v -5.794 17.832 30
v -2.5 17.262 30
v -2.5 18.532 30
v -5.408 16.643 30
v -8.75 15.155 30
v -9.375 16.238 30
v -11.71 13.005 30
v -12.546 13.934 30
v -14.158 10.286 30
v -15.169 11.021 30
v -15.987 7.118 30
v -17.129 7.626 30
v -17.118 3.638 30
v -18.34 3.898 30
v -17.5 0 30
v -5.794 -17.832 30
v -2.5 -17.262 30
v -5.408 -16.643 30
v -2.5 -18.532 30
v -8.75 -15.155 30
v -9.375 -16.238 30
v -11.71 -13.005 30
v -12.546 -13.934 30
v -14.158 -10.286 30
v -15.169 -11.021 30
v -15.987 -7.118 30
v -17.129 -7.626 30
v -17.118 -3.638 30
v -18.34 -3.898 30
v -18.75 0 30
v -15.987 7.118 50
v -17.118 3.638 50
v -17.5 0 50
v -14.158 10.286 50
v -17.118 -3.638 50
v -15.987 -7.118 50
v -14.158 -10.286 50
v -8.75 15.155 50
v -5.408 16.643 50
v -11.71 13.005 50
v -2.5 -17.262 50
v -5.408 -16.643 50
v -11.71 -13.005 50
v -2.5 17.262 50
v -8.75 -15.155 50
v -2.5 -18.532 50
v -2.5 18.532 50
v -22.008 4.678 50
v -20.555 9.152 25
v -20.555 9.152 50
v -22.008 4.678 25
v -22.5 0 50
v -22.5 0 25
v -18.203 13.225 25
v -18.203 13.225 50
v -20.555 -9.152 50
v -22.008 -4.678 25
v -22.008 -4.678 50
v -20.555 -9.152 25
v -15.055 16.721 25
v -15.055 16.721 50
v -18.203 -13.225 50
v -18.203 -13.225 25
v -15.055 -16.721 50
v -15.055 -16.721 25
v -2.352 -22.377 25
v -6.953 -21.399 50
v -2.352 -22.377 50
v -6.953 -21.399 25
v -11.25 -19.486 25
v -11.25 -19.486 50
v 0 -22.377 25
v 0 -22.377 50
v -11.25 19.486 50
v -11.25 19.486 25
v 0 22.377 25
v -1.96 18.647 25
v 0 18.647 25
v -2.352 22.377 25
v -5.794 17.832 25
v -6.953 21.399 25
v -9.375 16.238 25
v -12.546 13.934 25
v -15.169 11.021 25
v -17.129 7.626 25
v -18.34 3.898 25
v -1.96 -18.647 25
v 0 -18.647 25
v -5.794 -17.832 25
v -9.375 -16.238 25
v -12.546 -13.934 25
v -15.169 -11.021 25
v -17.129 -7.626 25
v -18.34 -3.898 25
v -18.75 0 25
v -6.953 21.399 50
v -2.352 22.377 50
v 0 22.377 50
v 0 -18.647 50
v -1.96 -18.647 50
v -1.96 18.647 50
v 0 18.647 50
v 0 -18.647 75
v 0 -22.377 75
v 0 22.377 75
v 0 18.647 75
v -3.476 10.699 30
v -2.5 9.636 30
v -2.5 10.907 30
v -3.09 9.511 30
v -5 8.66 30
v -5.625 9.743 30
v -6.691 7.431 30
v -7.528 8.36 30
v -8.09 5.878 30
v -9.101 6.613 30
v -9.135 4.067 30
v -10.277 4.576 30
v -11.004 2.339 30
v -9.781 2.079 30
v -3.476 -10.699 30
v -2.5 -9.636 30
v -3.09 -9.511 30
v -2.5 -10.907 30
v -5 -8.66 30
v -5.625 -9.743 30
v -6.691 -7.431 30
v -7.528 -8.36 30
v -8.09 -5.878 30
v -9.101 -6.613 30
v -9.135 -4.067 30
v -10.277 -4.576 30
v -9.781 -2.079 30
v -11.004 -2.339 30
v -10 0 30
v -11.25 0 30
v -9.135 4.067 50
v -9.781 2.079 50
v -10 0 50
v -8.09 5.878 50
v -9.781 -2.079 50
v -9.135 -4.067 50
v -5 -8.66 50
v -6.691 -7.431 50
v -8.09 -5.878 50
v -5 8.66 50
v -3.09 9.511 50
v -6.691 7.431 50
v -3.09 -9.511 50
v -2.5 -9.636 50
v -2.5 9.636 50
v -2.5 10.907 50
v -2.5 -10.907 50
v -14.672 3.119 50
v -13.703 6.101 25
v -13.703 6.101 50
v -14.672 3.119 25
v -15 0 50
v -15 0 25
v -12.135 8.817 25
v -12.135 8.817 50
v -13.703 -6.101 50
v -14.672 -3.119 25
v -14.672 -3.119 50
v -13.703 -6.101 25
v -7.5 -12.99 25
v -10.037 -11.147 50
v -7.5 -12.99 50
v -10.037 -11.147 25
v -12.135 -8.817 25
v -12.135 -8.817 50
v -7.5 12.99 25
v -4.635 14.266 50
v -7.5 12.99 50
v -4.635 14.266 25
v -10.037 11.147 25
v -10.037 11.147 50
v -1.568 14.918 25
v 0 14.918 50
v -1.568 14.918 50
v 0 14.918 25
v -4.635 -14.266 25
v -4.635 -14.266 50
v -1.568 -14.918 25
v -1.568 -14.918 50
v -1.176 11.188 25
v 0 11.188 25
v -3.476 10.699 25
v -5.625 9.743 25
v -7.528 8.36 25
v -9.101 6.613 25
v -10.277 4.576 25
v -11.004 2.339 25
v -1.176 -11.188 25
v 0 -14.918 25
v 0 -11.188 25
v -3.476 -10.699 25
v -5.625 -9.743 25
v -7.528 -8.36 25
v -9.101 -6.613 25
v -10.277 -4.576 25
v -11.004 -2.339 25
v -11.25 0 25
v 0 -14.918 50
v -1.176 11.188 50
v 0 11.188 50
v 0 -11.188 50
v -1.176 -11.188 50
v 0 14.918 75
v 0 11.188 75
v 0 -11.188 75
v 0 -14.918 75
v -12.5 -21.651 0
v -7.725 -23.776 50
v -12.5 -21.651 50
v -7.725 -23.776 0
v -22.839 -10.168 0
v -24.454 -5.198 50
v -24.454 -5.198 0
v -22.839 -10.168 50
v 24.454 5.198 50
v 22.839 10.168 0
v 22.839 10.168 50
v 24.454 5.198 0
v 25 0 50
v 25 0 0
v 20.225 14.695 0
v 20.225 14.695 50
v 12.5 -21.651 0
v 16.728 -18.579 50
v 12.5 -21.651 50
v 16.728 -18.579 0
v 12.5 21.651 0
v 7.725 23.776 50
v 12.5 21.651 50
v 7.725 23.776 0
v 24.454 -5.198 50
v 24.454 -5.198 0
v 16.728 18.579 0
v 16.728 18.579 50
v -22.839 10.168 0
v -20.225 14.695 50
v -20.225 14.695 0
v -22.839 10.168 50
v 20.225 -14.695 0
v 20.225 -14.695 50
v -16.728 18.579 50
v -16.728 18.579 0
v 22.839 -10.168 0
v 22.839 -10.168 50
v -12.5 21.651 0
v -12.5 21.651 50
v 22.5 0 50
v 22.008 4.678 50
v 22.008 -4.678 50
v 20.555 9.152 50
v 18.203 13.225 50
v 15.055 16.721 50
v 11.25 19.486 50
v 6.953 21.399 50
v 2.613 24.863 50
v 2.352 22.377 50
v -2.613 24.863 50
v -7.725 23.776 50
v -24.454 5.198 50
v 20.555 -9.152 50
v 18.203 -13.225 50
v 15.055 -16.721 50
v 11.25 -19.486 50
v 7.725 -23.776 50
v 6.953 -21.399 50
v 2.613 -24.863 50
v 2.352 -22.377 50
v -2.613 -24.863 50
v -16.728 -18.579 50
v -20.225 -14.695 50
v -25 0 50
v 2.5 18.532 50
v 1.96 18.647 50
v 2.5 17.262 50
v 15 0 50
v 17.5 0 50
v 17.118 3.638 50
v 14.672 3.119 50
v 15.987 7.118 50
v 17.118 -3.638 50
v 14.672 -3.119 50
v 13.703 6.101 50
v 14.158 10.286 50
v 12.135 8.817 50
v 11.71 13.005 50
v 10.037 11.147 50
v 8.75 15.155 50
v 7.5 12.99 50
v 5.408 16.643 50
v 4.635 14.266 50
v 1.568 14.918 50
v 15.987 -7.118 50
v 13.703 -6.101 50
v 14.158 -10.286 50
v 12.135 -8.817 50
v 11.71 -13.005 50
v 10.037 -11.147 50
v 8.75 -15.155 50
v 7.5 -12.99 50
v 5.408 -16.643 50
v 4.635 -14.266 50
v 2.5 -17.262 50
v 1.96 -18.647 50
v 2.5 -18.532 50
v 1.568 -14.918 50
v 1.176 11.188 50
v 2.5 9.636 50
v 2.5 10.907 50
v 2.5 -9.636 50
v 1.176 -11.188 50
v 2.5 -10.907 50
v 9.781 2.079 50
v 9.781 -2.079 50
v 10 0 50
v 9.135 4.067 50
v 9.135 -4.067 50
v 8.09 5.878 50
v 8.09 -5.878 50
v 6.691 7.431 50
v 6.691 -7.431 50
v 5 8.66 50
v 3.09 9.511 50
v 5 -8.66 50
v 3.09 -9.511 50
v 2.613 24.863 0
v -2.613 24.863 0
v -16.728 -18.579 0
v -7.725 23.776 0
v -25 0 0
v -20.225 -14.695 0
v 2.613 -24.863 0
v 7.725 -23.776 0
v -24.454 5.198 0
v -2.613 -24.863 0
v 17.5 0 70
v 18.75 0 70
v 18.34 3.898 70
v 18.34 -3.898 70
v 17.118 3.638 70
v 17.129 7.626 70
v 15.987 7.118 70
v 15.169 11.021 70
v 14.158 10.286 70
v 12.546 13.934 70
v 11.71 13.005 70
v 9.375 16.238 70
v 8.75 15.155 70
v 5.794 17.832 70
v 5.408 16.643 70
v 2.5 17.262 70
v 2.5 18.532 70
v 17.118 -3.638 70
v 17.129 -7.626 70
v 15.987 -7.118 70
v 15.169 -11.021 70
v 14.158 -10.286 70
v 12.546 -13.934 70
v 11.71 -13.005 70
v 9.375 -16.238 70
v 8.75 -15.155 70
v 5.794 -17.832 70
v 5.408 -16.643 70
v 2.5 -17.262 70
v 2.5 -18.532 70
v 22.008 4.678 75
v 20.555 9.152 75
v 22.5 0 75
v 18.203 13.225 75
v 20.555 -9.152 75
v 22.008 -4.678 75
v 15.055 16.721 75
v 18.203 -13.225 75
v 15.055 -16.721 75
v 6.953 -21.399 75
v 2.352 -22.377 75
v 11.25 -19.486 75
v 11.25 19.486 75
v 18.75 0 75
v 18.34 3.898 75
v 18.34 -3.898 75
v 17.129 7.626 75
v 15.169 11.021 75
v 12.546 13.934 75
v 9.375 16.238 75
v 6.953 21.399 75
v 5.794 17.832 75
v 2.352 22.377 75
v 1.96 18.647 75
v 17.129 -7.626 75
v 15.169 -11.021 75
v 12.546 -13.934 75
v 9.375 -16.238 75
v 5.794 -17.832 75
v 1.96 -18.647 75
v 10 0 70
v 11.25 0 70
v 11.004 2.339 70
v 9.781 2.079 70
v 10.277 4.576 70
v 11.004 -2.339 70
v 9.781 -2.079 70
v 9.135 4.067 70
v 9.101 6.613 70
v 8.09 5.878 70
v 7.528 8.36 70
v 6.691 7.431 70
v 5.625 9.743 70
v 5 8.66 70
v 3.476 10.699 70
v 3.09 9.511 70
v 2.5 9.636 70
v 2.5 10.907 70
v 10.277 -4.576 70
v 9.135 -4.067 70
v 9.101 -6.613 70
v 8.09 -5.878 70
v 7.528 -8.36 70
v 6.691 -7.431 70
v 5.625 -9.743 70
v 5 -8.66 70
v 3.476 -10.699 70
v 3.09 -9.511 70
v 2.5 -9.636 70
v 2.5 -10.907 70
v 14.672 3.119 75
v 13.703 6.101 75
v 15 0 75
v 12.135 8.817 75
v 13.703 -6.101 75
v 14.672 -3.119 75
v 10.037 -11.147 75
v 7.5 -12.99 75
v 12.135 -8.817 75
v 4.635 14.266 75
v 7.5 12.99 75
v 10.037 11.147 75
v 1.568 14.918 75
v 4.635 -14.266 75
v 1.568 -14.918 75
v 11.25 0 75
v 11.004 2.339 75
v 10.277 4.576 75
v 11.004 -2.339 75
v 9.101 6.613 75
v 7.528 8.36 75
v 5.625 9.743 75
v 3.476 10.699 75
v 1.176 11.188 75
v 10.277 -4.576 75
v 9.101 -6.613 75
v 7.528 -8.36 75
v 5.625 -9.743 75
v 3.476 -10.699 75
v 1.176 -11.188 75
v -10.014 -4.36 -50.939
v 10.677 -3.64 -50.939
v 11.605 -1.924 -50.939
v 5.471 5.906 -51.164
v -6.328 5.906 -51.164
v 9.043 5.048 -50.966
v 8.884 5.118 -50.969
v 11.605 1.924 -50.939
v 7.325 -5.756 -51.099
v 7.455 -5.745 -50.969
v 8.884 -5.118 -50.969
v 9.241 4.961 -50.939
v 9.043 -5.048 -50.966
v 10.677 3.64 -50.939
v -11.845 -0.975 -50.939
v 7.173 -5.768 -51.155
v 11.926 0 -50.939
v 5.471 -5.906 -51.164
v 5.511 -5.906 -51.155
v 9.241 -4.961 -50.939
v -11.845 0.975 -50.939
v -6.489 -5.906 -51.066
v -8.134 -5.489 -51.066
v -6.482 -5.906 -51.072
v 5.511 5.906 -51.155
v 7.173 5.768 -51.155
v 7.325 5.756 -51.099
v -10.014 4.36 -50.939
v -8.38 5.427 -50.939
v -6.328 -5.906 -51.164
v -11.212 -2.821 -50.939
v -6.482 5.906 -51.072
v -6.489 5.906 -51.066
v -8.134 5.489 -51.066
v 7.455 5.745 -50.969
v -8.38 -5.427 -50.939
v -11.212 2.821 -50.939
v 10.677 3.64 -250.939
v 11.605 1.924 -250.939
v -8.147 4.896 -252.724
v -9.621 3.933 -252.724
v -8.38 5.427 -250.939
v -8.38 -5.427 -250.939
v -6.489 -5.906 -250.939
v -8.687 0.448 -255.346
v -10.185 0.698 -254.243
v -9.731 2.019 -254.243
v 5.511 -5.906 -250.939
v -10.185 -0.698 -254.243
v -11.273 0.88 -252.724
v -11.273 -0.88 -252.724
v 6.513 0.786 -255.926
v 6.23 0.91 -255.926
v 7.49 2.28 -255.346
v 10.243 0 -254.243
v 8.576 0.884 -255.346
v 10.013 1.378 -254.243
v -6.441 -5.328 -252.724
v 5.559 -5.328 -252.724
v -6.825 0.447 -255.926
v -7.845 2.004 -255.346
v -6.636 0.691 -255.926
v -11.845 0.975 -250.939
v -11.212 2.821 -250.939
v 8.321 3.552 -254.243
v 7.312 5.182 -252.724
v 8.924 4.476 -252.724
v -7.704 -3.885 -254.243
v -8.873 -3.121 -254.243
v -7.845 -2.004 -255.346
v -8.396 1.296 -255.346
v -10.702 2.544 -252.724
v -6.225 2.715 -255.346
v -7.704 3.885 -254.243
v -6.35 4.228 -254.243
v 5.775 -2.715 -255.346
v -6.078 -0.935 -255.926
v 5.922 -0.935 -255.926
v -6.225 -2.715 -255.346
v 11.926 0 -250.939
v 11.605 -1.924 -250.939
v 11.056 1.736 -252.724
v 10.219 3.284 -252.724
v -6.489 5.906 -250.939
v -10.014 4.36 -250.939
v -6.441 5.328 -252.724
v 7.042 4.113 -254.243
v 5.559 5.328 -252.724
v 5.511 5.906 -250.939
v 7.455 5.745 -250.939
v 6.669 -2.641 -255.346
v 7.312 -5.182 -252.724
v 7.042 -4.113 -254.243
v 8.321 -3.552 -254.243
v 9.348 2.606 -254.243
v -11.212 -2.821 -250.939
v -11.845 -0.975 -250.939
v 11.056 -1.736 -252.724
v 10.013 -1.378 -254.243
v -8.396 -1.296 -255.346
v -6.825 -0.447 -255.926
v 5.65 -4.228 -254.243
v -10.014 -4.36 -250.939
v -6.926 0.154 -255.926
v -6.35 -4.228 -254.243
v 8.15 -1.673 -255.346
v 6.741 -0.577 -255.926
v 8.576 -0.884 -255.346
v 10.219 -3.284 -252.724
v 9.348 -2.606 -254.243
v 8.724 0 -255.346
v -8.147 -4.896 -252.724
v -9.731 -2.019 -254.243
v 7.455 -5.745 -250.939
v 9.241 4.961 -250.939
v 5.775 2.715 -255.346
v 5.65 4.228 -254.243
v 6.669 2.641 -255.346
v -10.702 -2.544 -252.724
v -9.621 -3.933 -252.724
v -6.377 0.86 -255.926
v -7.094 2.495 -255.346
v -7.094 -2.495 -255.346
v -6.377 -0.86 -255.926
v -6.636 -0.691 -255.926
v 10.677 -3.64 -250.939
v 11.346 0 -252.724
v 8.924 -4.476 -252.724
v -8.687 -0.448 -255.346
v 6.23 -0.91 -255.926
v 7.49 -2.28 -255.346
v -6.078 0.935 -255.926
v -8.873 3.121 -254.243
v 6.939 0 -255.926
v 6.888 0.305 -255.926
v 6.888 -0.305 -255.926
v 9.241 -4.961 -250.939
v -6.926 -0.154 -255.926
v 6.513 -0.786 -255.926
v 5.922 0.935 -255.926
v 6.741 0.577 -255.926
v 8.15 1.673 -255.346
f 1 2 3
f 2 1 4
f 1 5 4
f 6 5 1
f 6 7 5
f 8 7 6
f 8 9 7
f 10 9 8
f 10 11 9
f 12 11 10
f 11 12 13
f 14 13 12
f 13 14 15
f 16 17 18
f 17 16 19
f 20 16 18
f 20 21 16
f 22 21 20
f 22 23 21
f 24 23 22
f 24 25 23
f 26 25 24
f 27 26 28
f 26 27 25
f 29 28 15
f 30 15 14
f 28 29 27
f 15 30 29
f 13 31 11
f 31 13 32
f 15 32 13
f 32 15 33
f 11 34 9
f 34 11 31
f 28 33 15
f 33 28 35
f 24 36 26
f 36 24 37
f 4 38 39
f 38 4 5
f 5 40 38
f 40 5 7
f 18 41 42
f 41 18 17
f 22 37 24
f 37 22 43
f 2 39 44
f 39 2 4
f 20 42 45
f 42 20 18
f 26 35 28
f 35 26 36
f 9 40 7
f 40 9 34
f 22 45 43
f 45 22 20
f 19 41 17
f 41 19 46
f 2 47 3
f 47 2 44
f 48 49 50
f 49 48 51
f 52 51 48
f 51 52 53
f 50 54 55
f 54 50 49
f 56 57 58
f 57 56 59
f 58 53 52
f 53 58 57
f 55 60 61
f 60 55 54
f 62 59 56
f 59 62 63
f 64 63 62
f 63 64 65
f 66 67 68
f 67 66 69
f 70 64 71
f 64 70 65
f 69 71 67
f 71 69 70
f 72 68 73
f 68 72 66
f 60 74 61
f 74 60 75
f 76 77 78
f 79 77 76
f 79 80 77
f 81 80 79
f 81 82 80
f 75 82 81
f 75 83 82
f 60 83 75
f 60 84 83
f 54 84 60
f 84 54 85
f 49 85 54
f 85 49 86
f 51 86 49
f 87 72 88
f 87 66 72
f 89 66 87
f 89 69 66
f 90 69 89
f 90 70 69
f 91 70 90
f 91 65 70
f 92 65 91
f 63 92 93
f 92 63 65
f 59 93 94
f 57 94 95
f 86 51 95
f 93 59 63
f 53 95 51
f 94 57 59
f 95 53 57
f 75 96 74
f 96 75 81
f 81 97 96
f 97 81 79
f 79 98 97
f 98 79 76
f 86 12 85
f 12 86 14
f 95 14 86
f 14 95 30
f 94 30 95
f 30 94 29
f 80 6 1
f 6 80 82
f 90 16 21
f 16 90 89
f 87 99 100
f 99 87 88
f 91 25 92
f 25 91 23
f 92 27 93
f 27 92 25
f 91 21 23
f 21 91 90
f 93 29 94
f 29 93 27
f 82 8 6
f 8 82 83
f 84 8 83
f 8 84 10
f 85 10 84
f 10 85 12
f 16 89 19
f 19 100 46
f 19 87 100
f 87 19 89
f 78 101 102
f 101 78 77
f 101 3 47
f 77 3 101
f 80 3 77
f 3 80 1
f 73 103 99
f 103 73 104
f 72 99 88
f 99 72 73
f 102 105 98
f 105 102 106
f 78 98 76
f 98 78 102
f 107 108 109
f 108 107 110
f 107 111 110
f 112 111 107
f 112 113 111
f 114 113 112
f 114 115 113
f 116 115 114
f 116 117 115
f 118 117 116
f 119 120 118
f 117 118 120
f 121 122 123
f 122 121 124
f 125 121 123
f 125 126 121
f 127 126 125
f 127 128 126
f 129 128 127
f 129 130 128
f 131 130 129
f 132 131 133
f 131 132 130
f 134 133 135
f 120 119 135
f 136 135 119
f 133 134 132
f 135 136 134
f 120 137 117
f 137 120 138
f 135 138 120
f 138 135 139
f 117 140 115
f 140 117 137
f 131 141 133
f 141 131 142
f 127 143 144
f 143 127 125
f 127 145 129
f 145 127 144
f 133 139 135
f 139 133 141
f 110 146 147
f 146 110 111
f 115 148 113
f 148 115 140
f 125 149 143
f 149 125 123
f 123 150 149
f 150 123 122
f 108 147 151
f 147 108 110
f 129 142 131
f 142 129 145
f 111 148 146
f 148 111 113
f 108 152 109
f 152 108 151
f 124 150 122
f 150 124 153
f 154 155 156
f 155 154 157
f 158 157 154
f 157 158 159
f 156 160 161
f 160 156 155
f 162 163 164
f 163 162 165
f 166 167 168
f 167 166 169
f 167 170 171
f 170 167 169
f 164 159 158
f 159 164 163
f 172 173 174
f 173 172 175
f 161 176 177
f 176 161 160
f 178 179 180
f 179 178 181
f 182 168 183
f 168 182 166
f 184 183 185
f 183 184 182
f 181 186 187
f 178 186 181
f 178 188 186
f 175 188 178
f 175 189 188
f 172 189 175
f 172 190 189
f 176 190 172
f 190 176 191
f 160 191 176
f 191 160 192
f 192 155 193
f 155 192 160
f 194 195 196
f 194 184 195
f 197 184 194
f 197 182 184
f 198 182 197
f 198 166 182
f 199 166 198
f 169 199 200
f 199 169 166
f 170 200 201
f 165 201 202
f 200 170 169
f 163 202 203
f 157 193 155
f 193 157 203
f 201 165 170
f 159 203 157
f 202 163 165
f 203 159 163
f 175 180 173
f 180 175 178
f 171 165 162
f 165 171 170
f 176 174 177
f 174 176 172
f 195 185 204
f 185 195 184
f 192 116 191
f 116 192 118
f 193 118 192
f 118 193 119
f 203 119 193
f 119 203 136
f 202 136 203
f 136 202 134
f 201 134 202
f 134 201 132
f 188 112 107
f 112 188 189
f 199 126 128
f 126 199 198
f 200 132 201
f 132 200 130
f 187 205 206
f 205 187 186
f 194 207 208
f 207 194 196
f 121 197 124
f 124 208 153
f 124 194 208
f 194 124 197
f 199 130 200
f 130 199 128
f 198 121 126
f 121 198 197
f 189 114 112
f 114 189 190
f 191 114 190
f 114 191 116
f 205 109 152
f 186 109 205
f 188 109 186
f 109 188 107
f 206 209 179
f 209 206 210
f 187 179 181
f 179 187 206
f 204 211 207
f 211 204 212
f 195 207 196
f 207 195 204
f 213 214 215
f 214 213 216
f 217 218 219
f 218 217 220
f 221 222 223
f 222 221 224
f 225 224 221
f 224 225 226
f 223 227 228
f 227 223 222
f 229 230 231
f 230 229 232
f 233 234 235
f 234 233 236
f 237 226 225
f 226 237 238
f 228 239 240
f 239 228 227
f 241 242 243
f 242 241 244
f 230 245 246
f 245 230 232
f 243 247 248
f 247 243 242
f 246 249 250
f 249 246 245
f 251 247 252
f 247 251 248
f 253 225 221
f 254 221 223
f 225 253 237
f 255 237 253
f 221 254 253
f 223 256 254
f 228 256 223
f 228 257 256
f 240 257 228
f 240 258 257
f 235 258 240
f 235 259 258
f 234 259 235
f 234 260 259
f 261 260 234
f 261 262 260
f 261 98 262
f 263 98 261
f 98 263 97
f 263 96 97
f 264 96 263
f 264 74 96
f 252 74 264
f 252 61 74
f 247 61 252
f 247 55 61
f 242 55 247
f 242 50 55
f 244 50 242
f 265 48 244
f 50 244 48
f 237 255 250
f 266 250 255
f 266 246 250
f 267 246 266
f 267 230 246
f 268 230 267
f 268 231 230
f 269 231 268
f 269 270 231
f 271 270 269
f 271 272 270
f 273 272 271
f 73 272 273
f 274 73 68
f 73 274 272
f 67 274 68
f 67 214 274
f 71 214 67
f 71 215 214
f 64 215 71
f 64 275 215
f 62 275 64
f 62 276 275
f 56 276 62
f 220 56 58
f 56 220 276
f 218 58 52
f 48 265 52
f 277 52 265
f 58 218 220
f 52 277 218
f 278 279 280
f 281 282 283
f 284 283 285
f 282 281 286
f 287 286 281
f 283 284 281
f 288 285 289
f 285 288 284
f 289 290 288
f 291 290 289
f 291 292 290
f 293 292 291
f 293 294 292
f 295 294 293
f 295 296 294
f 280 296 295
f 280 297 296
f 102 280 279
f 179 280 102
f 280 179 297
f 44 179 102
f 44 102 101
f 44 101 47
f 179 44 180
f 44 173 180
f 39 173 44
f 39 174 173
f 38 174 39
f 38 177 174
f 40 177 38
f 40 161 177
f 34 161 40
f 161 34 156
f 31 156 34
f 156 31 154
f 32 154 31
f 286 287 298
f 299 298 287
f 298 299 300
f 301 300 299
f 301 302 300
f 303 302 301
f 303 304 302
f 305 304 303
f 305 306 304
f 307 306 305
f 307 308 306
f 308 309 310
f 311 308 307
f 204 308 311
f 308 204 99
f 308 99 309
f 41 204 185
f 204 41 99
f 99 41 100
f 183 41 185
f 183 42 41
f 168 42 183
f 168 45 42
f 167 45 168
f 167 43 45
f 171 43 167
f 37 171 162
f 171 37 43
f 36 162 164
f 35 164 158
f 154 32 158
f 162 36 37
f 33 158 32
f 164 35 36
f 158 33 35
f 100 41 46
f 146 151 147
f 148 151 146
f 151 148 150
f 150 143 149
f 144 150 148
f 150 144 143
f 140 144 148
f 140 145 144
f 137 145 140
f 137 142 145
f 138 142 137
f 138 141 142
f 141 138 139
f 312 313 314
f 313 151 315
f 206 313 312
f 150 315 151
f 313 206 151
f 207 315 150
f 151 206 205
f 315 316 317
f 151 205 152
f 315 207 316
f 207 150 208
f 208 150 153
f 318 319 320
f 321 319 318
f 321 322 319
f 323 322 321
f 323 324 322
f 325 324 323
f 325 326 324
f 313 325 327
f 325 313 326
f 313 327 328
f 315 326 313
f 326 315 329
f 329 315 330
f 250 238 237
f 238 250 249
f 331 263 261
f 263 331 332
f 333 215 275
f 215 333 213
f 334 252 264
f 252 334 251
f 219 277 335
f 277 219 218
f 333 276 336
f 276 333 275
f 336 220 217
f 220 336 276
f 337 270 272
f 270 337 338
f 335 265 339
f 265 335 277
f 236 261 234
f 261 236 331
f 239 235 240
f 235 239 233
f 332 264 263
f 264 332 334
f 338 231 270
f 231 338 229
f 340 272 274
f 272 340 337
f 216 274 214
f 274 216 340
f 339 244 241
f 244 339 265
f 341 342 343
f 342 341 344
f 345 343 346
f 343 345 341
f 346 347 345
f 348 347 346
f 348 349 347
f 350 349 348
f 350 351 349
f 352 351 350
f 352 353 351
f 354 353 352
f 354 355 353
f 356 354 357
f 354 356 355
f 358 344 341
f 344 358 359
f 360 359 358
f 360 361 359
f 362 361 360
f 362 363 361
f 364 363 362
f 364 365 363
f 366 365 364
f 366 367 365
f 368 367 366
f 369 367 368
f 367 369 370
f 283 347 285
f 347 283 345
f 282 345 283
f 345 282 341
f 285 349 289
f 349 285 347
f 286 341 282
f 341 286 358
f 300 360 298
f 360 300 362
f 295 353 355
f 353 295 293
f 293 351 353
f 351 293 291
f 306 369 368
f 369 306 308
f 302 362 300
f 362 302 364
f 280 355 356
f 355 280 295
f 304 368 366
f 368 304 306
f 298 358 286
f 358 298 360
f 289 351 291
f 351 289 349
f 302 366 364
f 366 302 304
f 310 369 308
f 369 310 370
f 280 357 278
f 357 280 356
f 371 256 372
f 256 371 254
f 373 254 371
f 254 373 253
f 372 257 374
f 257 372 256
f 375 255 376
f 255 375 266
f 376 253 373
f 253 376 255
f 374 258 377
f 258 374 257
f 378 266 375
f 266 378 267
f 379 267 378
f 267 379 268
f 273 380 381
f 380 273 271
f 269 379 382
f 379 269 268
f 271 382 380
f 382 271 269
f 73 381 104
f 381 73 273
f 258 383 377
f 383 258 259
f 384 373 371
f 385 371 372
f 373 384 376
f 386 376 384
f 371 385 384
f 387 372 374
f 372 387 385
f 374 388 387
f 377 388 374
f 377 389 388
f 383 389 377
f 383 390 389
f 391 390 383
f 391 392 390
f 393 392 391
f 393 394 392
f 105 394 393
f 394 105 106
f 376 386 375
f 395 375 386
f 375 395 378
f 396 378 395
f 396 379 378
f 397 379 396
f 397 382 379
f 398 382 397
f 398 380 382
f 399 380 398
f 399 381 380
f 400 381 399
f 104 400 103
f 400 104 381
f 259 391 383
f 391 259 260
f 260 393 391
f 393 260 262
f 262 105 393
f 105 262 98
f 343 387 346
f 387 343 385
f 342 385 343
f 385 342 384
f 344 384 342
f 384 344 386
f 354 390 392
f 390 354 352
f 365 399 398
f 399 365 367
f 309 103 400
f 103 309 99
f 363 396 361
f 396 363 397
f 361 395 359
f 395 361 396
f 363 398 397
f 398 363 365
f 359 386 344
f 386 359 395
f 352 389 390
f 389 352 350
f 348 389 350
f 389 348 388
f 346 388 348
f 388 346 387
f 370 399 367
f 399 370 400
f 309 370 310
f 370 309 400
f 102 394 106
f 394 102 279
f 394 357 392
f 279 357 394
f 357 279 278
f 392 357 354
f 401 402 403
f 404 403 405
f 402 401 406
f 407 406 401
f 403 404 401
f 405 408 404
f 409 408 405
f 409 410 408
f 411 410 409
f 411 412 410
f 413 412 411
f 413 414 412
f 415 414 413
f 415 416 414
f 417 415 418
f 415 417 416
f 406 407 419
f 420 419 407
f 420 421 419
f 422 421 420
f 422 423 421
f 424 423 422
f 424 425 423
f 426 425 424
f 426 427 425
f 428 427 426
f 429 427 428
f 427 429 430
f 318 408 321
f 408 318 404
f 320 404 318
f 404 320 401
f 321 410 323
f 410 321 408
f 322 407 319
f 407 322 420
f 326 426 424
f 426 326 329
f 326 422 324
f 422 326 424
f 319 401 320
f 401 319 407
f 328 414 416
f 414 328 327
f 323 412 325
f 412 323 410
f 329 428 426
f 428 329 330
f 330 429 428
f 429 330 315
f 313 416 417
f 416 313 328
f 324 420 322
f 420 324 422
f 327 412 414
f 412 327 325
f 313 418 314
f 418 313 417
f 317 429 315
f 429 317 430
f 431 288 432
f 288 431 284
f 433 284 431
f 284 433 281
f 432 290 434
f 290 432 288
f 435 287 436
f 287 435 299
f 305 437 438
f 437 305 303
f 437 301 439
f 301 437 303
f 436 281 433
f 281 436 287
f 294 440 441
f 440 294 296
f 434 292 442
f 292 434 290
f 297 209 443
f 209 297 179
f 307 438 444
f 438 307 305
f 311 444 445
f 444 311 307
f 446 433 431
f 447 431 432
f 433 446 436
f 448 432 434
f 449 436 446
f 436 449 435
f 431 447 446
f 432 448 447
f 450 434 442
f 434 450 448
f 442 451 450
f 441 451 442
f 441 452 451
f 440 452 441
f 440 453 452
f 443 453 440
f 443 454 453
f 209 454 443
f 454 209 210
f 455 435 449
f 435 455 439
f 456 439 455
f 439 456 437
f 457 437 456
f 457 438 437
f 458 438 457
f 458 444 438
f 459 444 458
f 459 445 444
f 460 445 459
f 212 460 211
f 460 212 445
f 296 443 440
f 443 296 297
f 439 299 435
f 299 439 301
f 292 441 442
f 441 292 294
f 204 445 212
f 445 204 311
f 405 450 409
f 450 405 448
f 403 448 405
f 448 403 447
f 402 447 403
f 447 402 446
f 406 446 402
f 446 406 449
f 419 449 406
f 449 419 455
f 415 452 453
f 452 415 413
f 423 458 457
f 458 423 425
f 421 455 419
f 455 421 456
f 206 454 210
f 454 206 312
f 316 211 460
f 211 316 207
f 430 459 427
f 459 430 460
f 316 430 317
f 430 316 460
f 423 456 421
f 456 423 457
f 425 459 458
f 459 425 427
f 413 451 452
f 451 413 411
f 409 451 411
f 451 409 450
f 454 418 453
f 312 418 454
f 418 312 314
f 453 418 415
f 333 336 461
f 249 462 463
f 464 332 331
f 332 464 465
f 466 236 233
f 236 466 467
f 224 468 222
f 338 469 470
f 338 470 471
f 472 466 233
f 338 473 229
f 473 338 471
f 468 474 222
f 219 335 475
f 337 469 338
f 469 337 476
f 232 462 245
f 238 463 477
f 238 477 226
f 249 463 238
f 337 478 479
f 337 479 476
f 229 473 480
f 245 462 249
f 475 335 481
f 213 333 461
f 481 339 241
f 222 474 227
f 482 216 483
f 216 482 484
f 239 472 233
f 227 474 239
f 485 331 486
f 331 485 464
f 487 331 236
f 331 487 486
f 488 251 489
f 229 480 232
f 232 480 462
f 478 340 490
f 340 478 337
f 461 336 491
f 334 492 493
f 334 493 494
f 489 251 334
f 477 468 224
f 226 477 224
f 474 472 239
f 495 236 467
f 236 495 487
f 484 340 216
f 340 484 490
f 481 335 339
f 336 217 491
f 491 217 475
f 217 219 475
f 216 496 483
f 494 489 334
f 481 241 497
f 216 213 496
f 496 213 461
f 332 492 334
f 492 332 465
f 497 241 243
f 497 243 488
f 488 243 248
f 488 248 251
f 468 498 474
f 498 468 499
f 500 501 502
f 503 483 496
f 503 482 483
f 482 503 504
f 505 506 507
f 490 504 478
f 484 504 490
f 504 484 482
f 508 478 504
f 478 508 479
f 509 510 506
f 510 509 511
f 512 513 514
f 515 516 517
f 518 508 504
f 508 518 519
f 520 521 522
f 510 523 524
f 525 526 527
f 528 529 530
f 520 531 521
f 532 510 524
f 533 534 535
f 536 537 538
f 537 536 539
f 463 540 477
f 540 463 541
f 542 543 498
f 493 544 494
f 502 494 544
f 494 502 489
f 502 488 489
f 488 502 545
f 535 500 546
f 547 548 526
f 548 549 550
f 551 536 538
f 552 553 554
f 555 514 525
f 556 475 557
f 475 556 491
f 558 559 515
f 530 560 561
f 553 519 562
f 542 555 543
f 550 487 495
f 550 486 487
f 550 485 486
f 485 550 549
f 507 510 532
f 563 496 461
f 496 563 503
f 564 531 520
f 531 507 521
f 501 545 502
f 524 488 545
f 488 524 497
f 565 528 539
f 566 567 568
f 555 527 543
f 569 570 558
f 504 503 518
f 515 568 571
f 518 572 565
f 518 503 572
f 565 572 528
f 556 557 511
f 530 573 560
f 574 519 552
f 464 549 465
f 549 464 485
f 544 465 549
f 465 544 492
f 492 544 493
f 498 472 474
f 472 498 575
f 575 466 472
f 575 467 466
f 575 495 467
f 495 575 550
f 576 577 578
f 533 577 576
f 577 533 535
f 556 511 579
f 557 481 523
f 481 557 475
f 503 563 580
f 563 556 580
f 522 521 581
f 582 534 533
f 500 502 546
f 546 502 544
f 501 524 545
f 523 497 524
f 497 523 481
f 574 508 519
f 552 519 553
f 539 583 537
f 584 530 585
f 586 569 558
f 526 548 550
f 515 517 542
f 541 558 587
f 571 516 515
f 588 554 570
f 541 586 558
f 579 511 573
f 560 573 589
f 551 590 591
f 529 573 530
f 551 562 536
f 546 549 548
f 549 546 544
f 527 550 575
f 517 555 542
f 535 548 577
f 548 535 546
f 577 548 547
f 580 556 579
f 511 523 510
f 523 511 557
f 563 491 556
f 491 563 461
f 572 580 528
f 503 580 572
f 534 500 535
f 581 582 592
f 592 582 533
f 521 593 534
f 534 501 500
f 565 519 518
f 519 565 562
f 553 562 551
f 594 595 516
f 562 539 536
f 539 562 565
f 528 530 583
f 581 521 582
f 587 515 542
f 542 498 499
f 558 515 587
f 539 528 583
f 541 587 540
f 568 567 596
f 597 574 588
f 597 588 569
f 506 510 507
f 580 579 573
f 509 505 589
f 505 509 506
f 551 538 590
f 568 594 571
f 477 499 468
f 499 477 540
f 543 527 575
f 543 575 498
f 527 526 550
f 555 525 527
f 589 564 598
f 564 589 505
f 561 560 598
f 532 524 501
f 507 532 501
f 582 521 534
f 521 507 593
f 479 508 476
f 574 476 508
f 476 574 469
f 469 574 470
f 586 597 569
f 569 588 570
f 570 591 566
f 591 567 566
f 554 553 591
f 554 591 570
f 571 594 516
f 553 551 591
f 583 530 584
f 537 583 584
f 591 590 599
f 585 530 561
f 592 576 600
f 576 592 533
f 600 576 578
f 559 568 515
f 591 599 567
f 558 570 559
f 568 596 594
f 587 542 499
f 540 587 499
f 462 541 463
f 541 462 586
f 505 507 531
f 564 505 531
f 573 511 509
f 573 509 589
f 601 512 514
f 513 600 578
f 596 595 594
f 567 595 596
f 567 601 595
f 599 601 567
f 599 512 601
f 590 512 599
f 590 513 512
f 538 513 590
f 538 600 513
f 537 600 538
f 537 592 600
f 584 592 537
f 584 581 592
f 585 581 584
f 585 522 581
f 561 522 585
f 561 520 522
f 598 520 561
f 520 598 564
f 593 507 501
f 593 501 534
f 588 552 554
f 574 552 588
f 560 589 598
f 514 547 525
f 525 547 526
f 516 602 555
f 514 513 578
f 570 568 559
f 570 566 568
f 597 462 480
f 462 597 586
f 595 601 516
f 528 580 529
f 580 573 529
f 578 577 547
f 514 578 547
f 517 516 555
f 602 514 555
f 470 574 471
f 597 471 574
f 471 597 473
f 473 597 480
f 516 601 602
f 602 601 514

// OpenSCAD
module plugpole(dout=100,din=90,h=100,cutdepth=0){
    difference(){
        cylinder(h=h,d=dout);
        translate([0,0,-h]){cylinder(h=h*3,d=din);}
        translate([-dout+cutdepth,0,0]){cube([dout*2,dout*2,h*3],true);}
    }
}
module plug_plates(h=50){
    color("#e7c583"){plugpole(80,70,h,5);}
    color("#444"){plugpole(90,75,h+5);}
    color("#e7c583"){plugpole(50,40,h,5);}
    color("#444"){plugpole(60,45,h+5);}
    //color("#e7c583"){plugpole(20,10,50+10);}
    //color("#444"){plugpole(30,15,50+10+10);}
}
module plug(d=50,h=50){
    s = d/100;
    scale([s,s,1]){
        difference(){
            color("#EEE"){cylinder(h=h,d=100);}
            rotate([0,180,0]){translate([0,0,-h-10]){
                    plug_plates(30);
            }}
        }
        translate([0,0,h-10]){
            plug_plates(30);
        }
    }
}
module plug_to_cable(d1=50,d2=24,l=100){
    color("#EEE"){
        hull(){
            cylinder(d=d1,h=1);
            translate([-d2/2,0,-50]){sphere(d=d2);}
            translate([d2/2,0,-50]){sphere(d=d2);}
        }
        hull(){
            translate([-d2/2,0,-50]){sphere(d=d2);}
            translate([d2/2,0,-50]){sphere(d=d2);}
            translate([-d2/2,0,-l-50]){sphere(d=d2);}
            translate([d2/2,0,-l-50]){sphere(d=d2);}
        }
    }
}
plug(d=50);
plug_to_cable(d1=50,d2=12,l=200);
